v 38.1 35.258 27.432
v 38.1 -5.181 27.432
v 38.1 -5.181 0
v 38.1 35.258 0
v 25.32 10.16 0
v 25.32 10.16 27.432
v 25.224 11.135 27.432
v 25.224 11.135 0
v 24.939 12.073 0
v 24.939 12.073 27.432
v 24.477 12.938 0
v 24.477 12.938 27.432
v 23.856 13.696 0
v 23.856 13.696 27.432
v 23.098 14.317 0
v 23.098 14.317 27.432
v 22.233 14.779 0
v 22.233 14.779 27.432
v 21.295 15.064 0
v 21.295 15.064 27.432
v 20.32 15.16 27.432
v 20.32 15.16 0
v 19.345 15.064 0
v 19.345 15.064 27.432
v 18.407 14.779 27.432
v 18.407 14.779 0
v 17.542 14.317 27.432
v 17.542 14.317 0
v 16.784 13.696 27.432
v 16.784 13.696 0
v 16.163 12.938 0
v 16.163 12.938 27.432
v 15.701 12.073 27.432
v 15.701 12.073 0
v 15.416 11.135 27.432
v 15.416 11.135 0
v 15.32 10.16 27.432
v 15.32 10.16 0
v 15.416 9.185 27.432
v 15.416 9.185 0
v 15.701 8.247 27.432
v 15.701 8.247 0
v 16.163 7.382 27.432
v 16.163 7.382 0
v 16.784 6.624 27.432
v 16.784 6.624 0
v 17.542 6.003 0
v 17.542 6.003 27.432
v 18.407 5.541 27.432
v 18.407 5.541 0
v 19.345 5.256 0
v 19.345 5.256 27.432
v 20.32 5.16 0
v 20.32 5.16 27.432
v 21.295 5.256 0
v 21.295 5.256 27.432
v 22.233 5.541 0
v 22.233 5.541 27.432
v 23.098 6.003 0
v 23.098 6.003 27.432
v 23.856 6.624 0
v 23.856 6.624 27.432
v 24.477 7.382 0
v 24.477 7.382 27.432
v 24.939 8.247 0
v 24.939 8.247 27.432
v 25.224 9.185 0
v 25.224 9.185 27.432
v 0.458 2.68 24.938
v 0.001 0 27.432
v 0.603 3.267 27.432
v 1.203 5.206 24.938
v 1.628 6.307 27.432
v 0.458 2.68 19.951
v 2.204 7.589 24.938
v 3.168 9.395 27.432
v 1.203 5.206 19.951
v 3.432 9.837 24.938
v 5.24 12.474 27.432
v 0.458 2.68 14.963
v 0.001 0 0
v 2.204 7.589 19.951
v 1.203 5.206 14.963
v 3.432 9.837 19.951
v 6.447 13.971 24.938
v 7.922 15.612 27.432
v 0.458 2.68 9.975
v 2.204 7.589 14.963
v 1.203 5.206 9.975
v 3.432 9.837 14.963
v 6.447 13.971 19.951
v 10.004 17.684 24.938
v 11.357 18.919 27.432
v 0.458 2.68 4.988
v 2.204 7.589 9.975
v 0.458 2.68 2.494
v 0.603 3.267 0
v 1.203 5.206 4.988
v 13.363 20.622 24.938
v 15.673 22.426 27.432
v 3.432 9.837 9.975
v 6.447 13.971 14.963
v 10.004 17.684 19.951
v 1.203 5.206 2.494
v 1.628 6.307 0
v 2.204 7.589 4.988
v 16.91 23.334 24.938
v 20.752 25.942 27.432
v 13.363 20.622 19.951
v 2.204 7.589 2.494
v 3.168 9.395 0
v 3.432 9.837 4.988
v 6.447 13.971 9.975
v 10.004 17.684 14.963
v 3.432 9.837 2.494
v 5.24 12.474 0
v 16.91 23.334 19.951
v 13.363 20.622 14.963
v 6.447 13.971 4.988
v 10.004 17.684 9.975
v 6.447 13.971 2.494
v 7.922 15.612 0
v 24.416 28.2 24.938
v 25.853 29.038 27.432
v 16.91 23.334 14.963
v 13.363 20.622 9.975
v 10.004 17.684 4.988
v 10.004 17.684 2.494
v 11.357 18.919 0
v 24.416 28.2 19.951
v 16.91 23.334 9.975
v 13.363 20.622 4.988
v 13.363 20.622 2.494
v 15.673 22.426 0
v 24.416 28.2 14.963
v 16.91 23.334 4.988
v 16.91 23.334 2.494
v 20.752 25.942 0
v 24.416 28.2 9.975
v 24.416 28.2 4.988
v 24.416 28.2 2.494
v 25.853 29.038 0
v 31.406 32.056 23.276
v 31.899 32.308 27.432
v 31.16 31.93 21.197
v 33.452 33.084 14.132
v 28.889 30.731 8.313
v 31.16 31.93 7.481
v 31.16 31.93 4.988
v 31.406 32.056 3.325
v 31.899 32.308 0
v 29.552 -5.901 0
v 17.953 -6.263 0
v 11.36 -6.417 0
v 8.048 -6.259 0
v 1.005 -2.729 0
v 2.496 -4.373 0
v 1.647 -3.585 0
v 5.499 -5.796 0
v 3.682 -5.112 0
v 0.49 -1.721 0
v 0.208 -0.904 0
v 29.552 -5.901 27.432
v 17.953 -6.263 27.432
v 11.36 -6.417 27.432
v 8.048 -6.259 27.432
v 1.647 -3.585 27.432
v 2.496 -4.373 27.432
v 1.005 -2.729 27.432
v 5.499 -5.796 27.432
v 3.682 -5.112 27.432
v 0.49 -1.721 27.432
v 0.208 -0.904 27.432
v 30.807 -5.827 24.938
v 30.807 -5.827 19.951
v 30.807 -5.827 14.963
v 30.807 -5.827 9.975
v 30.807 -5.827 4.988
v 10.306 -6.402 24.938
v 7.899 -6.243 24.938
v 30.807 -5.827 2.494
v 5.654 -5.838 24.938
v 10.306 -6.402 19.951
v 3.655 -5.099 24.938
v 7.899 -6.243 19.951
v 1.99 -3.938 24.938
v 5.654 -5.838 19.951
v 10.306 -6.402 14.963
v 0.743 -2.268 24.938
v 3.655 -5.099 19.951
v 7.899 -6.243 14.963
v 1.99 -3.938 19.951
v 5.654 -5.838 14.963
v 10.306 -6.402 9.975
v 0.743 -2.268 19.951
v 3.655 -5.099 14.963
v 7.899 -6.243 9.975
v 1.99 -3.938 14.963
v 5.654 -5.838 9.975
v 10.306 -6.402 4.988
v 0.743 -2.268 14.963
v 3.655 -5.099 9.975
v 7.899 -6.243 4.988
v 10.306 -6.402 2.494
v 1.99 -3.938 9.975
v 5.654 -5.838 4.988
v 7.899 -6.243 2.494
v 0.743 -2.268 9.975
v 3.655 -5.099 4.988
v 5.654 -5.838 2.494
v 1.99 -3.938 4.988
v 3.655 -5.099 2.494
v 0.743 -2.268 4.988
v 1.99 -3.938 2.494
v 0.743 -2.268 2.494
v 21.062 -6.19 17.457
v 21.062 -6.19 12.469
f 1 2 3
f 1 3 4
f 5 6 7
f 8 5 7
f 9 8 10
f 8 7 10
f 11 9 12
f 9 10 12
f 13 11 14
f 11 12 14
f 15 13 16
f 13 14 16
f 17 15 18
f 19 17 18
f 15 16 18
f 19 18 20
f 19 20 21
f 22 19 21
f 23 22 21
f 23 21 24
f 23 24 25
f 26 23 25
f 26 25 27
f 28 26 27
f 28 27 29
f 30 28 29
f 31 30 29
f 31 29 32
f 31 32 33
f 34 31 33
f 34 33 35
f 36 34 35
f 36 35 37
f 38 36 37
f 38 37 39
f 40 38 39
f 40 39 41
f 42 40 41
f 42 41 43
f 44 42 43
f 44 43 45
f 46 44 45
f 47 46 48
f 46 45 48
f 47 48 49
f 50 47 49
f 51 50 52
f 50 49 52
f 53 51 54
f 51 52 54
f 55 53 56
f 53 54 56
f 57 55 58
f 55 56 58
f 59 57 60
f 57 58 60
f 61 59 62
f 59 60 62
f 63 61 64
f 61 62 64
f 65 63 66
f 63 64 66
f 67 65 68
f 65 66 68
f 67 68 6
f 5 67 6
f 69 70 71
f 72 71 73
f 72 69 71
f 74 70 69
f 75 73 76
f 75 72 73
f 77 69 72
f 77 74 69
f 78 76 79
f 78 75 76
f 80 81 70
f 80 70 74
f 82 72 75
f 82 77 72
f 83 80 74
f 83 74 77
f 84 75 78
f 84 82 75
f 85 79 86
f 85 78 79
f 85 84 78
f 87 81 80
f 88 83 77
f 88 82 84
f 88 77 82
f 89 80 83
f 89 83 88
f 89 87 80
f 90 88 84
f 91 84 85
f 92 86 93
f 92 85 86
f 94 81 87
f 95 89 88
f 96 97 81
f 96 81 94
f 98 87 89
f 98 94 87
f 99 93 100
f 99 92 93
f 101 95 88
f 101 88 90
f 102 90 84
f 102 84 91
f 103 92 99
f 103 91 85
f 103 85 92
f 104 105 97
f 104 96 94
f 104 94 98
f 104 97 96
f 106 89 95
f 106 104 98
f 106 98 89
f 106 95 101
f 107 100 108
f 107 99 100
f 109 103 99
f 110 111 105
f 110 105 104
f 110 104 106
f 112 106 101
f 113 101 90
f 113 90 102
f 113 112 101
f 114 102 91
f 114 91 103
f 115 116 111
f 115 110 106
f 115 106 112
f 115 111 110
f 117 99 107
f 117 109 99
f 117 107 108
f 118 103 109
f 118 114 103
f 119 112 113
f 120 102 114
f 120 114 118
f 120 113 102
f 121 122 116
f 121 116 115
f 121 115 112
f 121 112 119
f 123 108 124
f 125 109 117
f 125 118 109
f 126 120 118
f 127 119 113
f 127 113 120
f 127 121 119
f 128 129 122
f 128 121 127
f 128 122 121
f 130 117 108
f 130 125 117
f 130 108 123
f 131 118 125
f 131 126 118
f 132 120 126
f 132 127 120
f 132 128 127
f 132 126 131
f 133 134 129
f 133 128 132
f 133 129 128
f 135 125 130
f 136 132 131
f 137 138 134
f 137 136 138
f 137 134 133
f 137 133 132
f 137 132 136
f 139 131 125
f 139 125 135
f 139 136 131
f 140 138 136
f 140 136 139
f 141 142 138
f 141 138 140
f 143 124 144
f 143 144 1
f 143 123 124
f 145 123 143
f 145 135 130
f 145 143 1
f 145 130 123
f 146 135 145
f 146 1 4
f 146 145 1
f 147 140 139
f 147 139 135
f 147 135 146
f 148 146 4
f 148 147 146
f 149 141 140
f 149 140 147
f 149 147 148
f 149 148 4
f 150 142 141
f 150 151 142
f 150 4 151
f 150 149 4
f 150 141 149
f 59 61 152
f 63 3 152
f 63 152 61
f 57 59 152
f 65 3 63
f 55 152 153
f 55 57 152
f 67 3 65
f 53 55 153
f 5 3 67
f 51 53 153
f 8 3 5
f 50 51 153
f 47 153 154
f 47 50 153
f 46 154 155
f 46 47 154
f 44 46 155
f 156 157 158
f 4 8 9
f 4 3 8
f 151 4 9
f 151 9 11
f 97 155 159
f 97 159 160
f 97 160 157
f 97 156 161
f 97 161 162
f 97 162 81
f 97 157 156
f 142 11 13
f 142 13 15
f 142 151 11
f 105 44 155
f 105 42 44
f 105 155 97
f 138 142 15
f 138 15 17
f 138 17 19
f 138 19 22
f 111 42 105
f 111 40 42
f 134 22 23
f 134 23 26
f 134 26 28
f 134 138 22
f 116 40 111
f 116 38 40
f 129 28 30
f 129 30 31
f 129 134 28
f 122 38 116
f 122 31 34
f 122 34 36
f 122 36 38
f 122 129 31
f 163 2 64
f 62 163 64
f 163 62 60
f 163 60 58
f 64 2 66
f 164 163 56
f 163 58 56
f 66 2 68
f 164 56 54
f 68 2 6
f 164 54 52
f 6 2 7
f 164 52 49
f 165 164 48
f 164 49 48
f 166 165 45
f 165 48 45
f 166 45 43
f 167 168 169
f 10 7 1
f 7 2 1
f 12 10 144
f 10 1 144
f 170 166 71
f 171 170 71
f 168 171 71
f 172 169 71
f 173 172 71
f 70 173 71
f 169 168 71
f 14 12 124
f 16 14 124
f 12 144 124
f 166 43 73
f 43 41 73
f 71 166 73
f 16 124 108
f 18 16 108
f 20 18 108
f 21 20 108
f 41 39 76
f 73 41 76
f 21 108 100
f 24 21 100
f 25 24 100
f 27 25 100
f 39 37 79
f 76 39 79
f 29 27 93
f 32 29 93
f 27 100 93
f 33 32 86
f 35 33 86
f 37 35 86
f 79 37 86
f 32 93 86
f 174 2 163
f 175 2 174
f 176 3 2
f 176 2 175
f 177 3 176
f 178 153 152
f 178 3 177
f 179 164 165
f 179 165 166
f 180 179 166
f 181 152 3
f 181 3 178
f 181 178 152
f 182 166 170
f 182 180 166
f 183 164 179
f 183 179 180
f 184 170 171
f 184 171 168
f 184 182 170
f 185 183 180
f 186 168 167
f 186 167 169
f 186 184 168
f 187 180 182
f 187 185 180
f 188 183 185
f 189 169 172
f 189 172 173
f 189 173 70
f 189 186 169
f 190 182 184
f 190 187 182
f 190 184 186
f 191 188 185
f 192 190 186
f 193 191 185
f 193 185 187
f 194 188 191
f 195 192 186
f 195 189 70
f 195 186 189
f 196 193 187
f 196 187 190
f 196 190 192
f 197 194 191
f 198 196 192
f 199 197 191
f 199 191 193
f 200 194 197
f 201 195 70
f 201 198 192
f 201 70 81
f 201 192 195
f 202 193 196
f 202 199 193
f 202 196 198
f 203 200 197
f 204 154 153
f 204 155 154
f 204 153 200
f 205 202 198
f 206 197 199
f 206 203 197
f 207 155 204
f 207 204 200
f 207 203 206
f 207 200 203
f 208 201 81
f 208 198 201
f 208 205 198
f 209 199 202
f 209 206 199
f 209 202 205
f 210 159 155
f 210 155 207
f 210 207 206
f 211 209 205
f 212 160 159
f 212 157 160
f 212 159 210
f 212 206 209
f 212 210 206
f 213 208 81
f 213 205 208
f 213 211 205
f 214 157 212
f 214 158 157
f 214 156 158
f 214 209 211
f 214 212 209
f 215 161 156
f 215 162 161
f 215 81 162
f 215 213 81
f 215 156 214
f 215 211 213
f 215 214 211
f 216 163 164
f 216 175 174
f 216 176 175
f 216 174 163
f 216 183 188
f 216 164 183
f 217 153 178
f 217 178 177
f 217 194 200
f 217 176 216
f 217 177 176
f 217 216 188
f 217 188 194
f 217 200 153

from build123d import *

# Parameters (mm, degrees)
BOSS_EXTRUDE1_DEPTH = 27.432
SKETCH2_R           = 5
SKETCH2_R_2         = 3.175
CUT_EXTRUDE1_DEPTH  = 317.917465392
SKETCH3_W           = 293.188888759
SKETCH3_H           = 137.971241769
CUT_EXTRUDE2_DEPTH  = 317.917465392


with BuildPart() as part:
    # Sketch1 → Boss-Extrude1 (new body)
    with BuildSketch(Plane.XY):
        with BuildLine():
            add(Edge.make_bspline(
                [(0.000560351, 0.000130087), (0.810633127, 7.359196055), (8.649092025, 17.856605174), (26.286719818, 29.975176328), (52.111128271, 42.069215275), (89.597618475, 49.290763054), (131.400792109, 47.884831915), (173.256699242, 40.041104278), (217.961060472, 29.612974894), (256.952064401, 19.528920948), (290.35983767, 8.71099439), (301.273197721, 4.382828139), (314.816918223, -0.516206742), (309.846313895, 0.000130087)],
                knots=[0, 0, 0, 0, 0.060863618, 0.113688265, 0.188608742, 0.312908923, 0.448482434, 0.557612135, 0.691544113, 0.852438279, 0.92975597, 0.976058229, 1, 1, 1, 1], degree=3))
            add(Edge.make_bspline(
                [(309.846313895, 0.000130087), (303.956832565, 1.47095521), (293.989507544, 2.093987313), (276.26402299, 4.514356704), (260.846344817, 5.427413394), (235.858814759, 7.870306192), (205.101424636, 8.838080282), (157.718638092, 9.030650149), (110.497331172, 6.181495223), (66.506197185, -0.586669107), (36.454672816, -6.098499901), (15.316603331, -6.189065841), (1.230714189, -6.924076091), (0.000560351, 0.000130087)],
                knots=[0, 0, 0, 0, 0.057787081, 0.095274891, 0.171021118, 0.205339302, 0.335319146, 0.464904334, 0.658702312, 0.785511947, 0.893517288, 0.94309214, 1, 1, 1, 1], degree=3))
        make_face()
    extrude(amount=BOSS_EXTRUDE1_DEPTH)

    # Sketch2 → Cut-Extrude1 (cut, through all)
    with BuildSketch(Plane.XY.offset(27.432)):
        with Locations((20.32, 10.16)):
            Circle(SKETCH2_R)
        with Locations((227.296313895, 19.050130087)):
            Circle(SKETCH2_R_2)
    extrude(amount=-CUT_EXTRUDE1_DEPTH, mode=Mode.SUBTRACT)

    # Sketch3 → Cut-Extrude2 (cut, through all)
    with BuildSketch(Plane.XY.offset(27.432)):
        with Locations((184.69444438, 2.732377951)):
            Rectangle(SKETCH3_W, SKETCH3_H)
    extrude(amount=-CUT_EXTRUDE2_DEPTH, mode=Mode.SUBTRACT)


solid = part.part
